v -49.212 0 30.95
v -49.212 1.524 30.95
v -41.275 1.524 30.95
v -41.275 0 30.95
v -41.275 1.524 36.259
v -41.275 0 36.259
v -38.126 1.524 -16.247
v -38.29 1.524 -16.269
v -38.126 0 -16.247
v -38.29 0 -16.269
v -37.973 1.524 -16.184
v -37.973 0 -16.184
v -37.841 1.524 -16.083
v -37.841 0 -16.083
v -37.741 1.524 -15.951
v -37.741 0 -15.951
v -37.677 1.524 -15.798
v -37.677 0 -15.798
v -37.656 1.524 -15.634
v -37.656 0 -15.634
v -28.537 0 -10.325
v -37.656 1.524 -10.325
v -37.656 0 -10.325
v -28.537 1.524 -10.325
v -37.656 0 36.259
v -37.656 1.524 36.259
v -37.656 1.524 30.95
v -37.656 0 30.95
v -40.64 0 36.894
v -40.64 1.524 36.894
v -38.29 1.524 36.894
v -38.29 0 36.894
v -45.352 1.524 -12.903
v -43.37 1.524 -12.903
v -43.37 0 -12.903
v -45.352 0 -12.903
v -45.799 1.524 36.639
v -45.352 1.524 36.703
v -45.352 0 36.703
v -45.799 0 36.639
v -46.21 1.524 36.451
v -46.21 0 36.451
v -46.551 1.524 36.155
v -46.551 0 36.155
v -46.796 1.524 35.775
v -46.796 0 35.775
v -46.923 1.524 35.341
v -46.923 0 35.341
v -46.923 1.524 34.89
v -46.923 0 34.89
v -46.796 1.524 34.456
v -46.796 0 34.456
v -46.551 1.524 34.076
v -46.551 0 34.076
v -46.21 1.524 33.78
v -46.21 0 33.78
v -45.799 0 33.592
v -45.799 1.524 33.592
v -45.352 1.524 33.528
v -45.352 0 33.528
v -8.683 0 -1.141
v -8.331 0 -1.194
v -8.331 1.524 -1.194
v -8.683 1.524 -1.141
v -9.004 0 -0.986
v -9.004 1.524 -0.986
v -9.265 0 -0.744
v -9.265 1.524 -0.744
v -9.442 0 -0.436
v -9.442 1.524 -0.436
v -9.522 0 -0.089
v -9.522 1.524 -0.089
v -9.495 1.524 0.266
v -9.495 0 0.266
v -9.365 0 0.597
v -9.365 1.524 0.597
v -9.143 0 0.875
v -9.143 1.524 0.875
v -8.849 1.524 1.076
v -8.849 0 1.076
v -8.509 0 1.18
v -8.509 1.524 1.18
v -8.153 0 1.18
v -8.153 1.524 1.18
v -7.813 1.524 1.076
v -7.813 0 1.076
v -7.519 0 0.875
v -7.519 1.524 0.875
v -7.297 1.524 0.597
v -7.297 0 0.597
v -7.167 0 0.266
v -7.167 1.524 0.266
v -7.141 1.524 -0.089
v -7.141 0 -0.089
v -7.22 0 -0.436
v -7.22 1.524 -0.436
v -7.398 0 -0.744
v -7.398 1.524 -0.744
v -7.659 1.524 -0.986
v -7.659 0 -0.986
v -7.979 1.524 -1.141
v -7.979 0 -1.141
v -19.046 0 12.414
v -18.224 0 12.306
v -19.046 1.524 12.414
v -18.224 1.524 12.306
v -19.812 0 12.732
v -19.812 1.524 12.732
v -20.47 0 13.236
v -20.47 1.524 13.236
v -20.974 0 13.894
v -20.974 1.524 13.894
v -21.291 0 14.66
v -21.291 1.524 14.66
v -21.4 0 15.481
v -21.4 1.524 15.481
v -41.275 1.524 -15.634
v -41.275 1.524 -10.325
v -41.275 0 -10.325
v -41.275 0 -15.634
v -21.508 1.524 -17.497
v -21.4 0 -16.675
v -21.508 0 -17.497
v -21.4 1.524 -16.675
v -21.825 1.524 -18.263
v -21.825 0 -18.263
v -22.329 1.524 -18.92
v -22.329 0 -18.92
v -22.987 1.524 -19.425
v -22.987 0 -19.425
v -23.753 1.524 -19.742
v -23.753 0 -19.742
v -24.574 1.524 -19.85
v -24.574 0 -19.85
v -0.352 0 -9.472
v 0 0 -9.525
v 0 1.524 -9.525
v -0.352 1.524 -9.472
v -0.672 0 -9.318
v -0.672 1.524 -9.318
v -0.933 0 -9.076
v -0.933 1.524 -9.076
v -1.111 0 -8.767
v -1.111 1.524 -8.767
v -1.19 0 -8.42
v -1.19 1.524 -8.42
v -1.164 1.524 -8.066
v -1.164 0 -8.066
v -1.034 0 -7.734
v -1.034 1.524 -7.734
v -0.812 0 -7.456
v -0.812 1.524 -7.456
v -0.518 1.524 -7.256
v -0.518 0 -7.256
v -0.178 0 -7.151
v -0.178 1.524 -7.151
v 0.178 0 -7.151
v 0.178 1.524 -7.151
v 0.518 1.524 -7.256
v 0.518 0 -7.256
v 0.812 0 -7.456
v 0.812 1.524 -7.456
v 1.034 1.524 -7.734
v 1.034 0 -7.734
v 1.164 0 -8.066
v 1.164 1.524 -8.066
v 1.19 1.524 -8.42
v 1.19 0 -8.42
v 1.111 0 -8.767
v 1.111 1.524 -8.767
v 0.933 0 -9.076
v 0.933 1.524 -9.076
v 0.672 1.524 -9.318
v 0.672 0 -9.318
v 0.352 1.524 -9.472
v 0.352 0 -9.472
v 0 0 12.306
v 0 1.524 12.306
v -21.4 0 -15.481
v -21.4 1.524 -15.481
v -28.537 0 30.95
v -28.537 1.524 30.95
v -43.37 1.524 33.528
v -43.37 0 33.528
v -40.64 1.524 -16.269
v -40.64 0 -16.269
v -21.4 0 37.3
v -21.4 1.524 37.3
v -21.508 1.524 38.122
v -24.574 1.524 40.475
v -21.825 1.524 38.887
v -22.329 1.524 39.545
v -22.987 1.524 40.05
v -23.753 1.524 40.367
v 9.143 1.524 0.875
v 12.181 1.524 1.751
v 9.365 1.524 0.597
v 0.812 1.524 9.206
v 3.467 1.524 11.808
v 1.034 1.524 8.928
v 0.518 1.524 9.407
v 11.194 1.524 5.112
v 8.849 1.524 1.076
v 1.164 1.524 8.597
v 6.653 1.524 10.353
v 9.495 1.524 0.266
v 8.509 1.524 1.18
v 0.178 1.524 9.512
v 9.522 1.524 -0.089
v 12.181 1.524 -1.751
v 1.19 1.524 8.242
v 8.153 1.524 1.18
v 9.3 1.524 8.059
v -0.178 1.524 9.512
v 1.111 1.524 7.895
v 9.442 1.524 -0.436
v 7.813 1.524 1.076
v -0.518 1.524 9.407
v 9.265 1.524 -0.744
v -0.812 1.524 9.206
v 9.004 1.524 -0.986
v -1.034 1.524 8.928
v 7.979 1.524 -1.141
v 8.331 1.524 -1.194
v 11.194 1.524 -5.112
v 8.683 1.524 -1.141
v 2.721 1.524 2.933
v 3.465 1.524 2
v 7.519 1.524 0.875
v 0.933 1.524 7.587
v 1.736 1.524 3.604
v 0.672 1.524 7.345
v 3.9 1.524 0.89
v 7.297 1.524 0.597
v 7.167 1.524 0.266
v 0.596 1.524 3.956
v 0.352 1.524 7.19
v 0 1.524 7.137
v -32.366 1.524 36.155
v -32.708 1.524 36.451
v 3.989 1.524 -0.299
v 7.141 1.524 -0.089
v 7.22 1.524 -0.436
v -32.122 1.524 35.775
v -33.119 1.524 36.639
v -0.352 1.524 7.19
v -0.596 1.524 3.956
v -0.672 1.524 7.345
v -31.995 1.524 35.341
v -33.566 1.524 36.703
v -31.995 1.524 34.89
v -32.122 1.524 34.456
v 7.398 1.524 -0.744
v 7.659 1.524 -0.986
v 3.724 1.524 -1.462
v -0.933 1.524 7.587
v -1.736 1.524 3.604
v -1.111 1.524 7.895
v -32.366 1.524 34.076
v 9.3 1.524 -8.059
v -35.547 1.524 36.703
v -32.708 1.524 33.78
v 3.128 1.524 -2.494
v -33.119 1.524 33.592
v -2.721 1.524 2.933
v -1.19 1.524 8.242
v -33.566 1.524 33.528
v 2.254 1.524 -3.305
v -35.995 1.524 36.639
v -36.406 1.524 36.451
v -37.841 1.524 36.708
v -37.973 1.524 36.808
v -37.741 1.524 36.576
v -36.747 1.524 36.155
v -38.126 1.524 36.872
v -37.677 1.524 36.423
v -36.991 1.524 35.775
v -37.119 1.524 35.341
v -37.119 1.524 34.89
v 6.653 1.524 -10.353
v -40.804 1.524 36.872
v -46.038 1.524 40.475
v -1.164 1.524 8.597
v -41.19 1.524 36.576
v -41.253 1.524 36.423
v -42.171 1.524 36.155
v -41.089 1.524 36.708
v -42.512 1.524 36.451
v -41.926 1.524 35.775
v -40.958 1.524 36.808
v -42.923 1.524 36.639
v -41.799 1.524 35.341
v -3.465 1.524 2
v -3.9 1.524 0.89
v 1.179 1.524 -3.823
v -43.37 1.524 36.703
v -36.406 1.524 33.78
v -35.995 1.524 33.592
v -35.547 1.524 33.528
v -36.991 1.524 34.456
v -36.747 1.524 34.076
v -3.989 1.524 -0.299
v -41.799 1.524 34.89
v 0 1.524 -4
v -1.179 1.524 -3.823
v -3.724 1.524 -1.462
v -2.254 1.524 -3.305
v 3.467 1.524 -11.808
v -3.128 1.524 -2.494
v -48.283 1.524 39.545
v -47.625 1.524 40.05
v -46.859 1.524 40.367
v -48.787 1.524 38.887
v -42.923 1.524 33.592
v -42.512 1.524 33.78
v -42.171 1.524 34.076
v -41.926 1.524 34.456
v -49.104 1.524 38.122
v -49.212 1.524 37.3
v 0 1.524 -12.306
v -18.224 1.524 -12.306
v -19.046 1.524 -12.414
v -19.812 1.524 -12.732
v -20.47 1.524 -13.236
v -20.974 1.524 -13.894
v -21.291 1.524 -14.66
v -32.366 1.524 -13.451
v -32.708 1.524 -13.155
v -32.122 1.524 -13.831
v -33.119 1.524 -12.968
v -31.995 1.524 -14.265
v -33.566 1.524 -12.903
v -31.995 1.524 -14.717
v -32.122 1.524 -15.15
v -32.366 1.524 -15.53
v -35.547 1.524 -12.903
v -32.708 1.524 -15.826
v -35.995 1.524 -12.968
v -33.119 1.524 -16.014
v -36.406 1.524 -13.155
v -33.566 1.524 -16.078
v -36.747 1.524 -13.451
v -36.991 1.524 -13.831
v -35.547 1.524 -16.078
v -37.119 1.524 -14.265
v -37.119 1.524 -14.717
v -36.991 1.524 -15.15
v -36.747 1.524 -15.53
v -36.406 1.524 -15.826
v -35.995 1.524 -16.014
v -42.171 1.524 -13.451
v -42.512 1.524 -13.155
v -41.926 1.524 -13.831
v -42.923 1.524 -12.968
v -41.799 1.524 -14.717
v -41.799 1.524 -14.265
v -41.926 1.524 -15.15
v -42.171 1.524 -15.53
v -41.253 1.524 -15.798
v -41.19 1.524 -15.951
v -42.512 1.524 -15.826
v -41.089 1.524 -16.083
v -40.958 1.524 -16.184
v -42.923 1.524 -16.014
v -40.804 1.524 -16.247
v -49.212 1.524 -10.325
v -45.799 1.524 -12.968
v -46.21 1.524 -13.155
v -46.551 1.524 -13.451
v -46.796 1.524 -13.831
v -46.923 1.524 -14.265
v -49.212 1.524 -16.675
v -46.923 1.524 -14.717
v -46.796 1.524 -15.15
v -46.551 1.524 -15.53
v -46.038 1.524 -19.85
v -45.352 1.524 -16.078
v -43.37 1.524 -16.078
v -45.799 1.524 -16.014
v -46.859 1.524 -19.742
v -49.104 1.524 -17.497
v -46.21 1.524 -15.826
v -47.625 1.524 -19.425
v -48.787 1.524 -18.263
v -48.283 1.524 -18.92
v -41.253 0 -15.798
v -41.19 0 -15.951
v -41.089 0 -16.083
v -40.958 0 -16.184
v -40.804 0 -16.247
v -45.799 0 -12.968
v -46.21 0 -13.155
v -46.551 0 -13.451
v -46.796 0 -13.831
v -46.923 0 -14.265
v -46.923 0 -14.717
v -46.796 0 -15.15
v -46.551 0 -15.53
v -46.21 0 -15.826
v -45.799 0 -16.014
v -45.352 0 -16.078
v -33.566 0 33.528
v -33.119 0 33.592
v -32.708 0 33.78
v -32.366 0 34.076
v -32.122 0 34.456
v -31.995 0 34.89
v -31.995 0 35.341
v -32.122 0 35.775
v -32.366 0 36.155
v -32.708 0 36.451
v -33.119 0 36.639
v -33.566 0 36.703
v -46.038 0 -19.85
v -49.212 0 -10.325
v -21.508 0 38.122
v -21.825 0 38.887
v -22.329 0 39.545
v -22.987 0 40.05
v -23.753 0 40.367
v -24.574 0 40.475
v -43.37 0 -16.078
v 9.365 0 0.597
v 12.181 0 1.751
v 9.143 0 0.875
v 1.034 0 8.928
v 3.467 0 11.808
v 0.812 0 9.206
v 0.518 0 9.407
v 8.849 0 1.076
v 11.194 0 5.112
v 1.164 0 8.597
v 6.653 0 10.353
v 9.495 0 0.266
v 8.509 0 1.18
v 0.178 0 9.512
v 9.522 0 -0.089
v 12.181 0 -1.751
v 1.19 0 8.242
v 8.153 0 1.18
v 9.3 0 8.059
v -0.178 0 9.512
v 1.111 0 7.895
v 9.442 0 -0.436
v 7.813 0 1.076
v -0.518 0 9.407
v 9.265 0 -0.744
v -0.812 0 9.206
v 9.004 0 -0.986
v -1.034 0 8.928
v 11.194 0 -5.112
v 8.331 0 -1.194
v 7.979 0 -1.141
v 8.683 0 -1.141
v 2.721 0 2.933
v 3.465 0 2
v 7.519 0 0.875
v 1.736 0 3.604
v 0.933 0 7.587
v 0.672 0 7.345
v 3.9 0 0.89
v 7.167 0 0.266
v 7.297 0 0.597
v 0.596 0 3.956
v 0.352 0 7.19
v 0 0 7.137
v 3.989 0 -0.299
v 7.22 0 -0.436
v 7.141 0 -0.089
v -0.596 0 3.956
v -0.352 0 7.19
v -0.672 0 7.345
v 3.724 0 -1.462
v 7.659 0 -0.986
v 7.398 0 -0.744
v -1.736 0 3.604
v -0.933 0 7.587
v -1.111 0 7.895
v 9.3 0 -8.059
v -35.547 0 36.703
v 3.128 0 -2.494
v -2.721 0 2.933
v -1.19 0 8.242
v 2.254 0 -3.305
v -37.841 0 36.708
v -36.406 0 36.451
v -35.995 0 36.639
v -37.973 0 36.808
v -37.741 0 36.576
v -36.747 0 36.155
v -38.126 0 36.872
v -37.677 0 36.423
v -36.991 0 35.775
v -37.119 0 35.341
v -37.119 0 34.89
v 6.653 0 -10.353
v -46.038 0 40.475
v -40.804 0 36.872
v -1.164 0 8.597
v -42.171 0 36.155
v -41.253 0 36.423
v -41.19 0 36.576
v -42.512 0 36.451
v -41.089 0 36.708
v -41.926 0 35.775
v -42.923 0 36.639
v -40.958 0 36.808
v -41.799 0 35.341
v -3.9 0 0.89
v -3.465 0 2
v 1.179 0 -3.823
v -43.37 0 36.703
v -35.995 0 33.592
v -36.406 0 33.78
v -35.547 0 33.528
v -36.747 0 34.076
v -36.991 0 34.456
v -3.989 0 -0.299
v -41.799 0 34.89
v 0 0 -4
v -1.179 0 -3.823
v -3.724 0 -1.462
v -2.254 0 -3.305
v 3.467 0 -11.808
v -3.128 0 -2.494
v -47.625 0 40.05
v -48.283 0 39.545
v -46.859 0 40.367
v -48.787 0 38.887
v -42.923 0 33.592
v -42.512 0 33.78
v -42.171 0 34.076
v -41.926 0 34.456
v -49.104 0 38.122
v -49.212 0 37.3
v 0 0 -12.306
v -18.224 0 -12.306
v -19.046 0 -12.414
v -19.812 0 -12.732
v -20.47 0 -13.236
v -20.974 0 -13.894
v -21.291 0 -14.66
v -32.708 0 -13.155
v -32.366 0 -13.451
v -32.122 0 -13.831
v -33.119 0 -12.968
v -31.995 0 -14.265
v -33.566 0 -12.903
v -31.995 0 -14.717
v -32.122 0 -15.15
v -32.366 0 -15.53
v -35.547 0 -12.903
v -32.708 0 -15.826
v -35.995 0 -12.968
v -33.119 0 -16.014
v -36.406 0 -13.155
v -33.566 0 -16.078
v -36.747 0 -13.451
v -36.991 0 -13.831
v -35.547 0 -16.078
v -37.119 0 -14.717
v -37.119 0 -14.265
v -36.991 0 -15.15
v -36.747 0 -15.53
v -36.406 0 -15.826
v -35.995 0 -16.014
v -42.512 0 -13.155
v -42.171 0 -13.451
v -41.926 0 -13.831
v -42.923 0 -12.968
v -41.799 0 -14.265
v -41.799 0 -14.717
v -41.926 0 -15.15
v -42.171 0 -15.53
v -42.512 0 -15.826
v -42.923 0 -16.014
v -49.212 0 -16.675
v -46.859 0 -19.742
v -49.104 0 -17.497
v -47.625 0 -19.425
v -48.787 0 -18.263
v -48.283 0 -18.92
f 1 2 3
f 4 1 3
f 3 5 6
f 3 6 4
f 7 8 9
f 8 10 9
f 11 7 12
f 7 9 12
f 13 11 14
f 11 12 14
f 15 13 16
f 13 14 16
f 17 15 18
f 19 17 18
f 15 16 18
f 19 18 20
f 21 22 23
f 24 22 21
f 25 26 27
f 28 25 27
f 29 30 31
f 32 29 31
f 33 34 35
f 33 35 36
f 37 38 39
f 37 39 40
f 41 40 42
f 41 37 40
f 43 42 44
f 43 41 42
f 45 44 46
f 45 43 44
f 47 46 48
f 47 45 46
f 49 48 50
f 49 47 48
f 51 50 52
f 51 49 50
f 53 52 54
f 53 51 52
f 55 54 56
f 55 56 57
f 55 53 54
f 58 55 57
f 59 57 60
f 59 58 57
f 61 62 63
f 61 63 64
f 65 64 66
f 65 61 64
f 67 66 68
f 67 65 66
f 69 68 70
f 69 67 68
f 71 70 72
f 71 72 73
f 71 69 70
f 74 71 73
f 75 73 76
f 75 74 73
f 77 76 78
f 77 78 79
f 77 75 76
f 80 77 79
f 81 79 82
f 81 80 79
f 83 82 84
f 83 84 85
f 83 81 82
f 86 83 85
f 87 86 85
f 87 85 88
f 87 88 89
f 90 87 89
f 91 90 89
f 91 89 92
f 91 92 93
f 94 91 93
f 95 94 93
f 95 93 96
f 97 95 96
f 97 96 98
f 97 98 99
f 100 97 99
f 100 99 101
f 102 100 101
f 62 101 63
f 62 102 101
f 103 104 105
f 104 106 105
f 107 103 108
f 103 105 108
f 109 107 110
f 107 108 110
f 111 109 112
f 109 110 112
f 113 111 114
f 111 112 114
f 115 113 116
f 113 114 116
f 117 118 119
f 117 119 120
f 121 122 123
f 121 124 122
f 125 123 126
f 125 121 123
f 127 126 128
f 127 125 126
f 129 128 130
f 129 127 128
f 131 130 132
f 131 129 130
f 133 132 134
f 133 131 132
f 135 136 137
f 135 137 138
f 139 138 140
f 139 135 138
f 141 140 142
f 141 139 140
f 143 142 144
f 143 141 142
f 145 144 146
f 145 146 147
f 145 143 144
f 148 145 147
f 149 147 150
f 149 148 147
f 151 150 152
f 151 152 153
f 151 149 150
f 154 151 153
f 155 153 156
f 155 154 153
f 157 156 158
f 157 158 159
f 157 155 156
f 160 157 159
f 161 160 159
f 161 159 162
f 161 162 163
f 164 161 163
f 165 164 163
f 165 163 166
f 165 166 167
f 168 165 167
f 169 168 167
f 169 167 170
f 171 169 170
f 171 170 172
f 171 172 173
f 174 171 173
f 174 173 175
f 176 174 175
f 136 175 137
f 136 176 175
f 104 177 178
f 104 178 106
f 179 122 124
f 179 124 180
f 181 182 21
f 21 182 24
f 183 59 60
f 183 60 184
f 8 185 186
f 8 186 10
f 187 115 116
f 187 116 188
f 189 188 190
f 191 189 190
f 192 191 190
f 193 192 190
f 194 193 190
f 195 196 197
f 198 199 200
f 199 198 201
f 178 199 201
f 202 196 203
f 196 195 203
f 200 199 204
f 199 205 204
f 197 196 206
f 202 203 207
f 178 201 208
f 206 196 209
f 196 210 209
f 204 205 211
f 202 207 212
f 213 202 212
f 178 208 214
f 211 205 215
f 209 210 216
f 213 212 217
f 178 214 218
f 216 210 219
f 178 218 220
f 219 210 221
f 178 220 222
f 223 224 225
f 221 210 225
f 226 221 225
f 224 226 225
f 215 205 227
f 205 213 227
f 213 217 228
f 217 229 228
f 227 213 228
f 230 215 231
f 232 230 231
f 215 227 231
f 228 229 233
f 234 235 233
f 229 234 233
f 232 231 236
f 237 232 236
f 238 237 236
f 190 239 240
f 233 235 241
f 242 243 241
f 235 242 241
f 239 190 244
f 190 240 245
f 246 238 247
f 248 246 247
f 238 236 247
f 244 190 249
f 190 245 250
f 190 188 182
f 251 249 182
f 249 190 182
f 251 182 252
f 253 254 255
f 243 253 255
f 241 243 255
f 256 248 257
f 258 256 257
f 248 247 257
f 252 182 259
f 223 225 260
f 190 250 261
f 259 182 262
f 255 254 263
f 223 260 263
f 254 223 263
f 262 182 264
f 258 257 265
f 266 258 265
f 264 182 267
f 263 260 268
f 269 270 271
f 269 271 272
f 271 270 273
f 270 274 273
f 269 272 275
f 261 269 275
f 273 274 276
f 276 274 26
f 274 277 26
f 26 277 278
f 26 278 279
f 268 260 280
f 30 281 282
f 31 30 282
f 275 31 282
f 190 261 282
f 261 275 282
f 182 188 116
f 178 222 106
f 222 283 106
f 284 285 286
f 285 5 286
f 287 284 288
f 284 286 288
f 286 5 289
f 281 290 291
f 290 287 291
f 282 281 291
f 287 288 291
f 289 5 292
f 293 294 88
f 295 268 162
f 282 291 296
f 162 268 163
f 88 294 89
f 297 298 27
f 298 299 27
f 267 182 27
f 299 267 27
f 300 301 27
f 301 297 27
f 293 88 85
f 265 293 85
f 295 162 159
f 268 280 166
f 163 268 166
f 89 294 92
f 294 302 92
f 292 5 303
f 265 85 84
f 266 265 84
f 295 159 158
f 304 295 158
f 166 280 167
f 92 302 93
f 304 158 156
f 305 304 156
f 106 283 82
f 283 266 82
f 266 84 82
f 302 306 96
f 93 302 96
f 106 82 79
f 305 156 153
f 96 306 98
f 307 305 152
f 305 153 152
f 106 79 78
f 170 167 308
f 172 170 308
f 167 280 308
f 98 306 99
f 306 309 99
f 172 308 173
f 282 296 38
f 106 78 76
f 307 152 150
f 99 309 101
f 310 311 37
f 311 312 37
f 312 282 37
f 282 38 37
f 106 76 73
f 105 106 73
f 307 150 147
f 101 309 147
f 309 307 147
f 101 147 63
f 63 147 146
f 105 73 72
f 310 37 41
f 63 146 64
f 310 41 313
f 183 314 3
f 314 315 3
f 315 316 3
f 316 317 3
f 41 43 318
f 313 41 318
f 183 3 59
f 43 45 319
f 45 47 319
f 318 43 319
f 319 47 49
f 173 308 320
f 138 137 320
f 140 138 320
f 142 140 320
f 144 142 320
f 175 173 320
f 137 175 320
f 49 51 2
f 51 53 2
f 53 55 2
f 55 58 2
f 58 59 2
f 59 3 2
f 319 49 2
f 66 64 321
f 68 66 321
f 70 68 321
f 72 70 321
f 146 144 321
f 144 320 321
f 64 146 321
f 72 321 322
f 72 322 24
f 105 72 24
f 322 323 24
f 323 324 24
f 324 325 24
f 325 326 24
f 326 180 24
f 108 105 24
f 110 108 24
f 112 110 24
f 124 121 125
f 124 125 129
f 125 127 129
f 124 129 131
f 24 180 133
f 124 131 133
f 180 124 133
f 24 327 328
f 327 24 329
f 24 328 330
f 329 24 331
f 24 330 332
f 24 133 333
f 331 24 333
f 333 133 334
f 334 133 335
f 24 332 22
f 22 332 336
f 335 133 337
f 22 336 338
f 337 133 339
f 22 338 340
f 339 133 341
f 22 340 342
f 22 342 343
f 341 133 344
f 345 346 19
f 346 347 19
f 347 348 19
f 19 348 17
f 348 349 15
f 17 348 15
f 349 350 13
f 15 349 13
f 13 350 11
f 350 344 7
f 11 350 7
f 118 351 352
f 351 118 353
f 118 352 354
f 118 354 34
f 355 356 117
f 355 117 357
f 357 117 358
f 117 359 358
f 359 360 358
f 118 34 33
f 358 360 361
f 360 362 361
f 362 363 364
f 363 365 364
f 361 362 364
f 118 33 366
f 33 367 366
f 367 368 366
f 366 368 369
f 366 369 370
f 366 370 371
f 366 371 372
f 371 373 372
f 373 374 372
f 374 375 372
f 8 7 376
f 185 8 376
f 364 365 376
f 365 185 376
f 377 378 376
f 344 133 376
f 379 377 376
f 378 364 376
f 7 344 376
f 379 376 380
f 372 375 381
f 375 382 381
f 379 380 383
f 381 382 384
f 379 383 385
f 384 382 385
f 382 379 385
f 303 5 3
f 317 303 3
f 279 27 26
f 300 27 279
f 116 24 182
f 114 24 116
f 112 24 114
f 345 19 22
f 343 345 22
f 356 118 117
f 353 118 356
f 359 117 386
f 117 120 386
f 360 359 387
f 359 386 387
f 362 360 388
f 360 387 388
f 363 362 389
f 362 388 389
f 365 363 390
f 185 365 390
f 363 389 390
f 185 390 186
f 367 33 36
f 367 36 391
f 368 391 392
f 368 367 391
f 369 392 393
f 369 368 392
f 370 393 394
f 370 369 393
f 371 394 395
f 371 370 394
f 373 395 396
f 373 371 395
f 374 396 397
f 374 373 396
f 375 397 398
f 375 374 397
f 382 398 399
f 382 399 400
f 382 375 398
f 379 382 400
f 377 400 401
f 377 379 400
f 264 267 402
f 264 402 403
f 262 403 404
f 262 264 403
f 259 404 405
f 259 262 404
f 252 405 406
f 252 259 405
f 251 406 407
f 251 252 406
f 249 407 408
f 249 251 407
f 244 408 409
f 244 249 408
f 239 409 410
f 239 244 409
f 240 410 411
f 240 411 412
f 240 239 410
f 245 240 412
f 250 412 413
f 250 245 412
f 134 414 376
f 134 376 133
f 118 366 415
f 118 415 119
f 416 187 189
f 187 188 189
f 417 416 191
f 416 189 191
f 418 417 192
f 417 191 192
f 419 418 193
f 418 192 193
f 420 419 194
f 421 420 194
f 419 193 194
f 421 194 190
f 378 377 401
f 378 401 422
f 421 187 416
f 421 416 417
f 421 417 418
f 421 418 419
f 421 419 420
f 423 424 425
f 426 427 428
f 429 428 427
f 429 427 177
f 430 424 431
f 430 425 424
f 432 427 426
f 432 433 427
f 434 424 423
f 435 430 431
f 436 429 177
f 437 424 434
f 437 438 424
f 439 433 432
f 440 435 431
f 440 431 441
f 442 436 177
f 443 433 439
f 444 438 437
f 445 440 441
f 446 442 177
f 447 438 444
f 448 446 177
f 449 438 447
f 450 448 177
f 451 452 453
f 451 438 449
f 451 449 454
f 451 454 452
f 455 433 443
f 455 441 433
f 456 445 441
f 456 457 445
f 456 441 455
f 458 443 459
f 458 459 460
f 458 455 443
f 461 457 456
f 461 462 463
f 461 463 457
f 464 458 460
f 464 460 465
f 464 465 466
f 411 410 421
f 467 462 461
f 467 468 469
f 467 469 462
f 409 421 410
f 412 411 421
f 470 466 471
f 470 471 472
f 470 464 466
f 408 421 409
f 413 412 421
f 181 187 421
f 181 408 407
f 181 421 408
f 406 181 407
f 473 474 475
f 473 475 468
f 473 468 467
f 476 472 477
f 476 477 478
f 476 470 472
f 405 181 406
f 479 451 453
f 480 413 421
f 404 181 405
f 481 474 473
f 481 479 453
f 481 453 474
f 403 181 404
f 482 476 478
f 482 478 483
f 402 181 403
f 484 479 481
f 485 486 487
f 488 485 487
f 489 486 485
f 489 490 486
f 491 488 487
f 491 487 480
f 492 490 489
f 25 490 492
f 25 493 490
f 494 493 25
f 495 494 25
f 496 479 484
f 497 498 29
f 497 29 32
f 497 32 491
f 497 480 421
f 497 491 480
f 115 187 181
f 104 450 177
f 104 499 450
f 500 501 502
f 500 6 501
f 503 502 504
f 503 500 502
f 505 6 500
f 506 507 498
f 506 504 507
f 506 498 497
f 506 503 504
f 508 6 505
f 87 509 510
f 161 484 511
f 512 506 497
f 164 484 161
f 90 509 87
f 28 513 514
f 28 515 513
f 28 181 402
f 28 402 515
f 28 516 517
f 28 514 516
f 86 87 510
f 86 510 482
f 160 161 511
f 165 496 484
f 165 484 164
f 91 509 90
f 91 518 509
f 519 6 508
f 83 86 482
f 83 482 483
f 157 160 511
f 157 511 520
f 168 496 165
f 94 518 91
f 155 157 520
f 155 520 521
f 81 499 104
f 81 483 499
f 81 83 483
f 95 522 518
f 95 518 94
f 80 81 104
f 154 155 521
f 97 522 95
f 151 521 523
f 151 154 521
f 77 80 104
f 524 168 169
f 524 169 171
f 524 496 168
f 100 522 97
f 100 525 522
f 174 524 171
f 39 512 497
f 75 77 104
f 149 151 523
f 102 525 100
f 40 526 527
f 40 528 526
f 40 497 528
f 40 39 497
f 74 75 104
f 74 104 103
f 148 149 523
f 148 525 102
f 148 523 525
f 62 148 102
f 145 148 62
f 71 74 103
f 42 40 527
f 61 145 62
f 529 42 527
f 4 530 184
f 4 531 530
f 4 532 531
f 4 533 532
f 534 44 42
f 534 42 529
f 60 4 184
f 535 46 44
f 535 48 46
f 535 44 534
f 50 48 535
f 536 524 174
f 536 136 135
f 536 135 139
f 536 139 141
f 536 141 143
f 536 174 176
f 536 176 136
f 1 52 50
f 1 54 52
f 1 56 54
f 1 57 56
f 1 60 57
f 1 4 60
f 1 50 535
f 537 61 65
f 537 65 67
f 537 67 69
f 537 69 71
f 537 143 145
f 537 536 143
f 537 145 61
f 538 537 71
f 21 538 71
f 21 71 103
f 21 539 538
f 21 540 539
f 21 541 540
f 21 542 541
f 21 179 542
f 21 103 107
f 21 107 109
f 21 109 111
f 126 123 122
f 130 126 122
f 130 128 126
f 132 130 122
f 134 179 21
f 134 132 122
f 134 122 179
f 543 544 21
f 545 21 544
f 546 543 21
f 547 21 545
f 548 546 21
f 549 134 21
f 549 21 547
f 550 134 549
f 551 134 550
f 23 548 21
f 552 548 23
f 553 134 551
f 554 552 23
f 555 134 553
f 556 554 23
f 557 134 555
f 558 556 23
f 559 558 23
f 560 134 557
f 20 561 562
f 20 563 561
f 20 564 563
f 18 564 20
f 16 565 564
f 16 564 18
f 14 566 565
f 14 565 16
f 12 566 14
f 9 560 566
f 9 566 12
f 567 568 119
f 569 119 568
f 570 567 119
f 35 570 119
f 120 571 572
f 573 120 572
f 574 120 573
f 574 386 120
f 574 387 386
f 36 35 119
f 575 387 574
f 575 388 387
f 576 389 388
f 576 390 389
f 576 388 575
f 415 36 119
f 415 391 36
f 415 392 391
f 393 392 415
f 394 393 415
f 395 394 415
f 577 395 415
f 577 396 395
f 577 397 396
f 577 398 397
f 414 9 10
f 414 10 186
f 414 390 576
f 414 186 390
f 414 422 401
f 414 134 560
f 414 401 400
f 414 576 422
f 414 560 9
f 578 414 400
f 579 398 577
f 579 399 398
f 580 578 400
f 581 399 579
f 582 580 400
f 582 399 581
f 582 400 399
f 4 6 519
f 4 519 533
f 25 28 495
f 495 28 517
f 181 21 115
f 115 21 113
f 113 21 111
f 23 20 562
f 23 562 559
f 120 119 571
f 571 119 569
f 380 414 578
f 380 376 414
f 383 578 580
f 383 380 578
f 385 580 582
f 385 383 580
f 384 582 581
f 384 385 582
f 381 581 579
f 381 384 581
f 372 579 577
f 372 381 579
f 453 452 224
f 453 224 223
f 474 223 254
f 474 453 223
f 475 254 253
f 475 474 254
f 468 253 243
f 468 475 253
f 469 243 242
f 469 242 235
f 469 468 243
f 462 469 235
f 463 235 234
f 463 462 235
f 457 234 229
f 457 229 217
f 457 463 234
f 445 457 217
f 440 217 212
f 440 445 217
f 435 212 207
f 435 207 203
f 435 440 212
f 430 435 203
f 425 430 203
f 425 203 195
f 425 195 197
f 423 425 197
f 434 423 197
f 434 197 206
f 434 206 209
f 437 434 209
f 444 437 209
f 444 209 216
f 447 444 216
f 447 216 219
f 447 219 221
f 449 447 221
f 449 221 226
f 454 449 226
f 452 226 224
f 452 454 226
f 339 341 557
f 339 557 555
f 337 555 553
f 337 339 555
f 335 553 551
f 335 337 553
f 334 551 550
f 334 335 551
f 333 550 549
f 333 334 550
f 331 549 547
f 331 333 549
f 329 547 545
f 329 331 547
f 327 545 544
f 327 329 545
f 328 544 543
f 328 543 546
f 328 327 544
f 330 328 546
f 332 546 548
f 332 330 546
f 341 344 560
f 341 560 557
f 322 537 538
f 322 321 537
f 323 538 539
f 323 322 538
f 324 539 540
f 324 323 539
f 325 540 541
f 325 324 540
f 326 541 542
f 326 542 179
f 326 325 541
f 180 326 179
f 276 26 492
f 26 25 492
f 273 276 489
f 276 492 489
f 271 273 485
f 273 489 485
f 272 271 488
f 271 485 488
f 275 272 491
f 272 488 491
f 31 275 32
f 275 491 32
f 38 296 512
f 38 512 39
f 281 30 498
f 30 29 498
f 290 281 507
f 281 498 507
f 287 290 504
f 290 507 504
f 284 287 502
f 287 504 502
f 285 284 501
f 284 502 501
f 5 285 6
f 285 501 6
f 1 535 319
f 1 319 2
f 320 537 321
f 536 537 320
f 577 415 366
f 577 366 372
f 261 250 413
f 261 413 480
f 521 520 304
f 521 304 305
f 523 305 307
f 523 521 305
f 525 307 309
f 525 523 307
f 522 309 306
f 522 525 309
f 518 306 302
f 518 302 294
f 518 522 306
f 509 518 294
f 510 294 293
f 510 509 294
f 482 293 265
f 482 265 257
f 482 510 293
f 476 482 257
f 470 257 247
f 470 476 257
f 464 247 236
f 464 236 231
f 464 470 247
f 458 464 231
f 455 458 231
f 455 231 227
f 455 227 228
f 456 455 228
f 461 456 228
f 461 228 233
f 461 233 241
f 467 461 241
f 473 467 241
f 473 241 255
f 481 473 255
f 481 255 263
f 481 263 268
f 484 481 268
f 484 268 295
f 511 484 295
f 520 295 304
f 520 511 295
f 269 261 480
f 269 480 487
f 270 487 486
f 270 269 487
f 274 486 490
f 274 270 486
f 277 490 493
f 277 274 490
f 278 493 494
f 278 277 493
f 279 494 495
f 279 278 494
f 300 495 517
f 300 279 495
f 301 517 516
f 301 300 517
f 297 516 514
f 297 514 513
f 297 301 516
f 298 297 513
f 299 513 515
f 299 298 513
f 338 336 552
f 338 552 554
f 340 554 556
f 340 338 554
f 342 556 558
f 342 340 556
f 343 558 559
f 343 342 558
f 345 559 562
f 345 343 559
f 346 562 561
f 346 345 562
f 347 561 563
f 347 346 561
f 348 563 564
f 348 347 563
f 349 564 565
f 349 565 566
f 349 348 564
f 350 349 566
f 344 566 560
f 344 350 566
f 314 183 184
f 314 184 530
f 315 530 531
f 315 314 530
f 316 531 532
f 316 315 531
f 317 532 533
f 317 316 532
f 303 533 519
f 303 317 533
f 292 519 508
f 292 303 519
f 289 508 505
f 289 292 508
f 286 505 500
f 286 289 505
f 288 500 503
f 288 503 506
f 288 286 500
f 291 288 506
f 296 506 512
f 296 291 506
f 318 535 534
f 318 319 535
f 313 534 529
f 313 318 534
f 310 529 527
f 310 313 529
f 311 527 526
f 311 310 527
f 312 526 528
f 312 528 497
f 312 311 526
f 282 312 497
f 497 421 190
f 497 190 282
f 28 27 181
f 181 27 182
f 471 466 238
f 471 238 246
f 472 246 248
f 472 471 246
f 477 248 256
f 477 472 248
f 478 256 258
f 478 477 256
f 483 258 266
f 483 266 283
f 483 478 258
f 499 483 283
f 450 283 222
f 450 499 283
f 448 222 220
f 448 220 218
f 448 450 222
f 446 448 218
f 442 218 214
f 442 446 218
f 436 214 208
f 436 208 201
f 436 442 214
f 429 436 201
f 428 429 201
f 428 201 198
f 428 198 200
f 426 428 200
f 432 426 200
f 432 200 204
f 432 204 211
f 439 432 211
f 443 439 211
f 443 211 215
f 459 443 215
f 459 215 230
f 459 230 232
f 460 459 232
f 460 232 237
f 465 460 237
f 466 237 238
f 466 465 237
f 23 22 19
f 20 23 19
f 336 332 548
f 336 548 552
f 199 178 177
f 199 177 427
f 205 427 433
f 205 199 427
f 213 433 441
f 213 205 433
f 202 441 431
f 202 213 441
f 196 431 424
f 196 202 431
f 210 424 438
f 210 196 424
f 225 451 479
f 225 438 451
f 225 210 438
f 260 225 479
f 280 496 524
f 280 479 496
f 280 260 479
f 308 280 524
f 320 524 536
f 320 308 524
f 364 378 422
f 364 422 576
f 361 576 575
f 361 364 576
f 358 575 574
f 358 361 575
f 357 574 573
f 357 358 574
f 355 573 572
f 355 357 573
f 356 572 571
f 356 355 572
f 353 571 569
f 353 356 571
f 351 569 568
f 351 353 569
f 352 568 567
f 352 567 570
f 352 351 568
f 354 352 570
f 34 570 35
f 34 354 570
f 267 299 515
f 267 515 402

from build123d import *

# Parameters (mm, degrees)
SKETCH1_R          = 4.0005
SKETCH1_R_2        = 1.1938
BASE_FLANGE1_DEPTH = 1.524
SKETCH3_W          = 20.6756
SKETCH3_H          = 41.275
EXTRUDE1_DEPTH     = 1.524
SKETCH4_W          = 3.6195
SKETCH4_H          = 5.9436
EXTRUDE2_DEPTH     = 1.524
FILLET1_R          = 3.175
FILLET2_RADIUS     = 12.3063
FILLET2_LENGTH     = 1.524
FILLET3_R          = 0.635


# Sheet-metal steps are written as plain solids
with BuildPart() as part:
    # Sketch1 → Base-Flange1 (new body)
    with BuildSketch(Plane(origin=(0, 0, 0), x_dir=(1, 0, 0), z_dir=(0, 1, 0))):
        Polygon((12.3063, 12.3063), (12.3063, -12.3063), (-21.3995, -12.3063), (-21.3995, -40.4749), (-49.2125, -40.4749), (-49.2125, 19.8501), (-21.3995, 19.8501), (-21.3995, 12.3063), align=None)
        with Locations(Location((0, 0, 0), (0, 0, 90))):
            Circle(SKETCH1_R, mode=Mode.SUBTRACT)
        with Locations(Location((0, 8.3312, 0), (0, 0, 90))):
            Circle(SKETCH1_R_2, mode=Mode.SUBTRACT)
        with Locations(Location((8.3312, 0, 0), (0, 0, 90))):
            Circle(SKETCH1_R_2, mode=Mode.SUBTRACT)
        with Locations(Location((0, -8.3312, 0), (0, 0, 90))):
            Circle(SKETCH1_R_2, mode=Mode.SUBTRACT)
        with Locations(Location((-8.3312, 0, 0), (0, 0, 90))):
            Circle(SKETCH1_R_2, mode=Mode.SUBTRACT)
    extrude(amount=BASE_FLANGE1_DEPTH)

    # Sketch3 → Extrude1 (cut)
    with BuildSketch(Plane(origin=(0, 1.524, 0), x_dir=(1, 0, 0), z_dir=(0, 1, 0))):
        with Locations((-38.8747, -10.3124)):
            Rectangle(SKETCH3_W, SKETCH3_H)
    extrude(amount=-EXTRUDE1_DEPTH, mode=Mode.SUBTRACT)

    # Sketch4 → Extrude2 (cut)
    with BuildSketch(Plane(origin=(0, 1.524, 0), x_dir=(1, 0, 0), z_dir=(0, 1, 0))):
        with Locations((-39.46525, 13.2969)):
            Rectangle(SKETCH4_W, SKETCH4_H)
        with Locations((-39.46525, -33.9217)):
            Rectangle(SKETCH4_W, SKETCH4_H)
        with BuildLine():
            Line((-35.5473, 16.0782), (-33.5661, 16.0782))
            ThreePointArc((-33.5661, 16.0782), (-31.9786, 14.4907), (-33.5661, 12.9032))
            Line((-33.5661, 12.9032), (-35.5473, 12.9032))
            ThreePointArc((-35.5473, 12.9032), (-37.1348, 14.4907), (-35.5473, 16.0782))
        make_face()
        with BuildLine():
            Line((-45.3517, 16.0782), (-43.3705, 16.0782))
            ThreePointArc((-43.3705, 16.0782), (-41.783, 14.4907), (-43.3705, 12.9032))
            Line((-43.3705, 12.9032), (-45.3517, 12.9032))
            ThreePointArc((-45.3517, 12.9032), (-46.9392, 14.4907), (-45.3517, 16.0782))
        make_face()
        with BuildLine():
            Line((-35.5473, -33.528), (-33.5661, -33.528))
            ThreePointArc((-33.5661, -33.528), (-31.9786, -35.1155), (-33.5661, -36.703))
            Line((-33.5661, -36.703), (-35.5473, -36.703))
            ThreePointArc((-35.5473, -36.703), (-37.1348, -35.1155), (-35.5473, -33.528))
        make_face()
        with BuildLine():
            Line((-45.3517, -33.528), (-43.3705, -33.528))
            ThreePointArc((-43.3705, -33.528), (-41.783, -35.1155), (-43.3705, -36.703))
            Line((-43.3705, -36.703), (-45.3517, -36.703))
            ThreePointArc((-45.3517, -36.703), (-46.9392, -35.1155), (-45.3517, -33.528))
        make_face()
    extrude(amount=-EXTRUDE2_DEPTH, mode=Mode.SUBTRACT)

    # Fillet1
    fillet1_edges = [part.edges().sort_by_distance(p)[0] for p in [
        (-21.3995, 0.762, 12.3063),
        (-21.3995, 0.762, 40.4749),
        (-49.2125, 0.762, 40.4749),
        (-49.2125, 0.762, -19.8501),
        (-21.3995, 0.762, -19.8501),
        (-21.3995, 0.762, -12.3063),
    ]]
    fillet(fillet1_edges, radius=FILLET1_R)

    # Fillet2: full round fillet: the end face becomes a half cylinder, R = half its width
    fillet2_face = Plane((12.3063, 0.762, 0), x_dir=(0, 1, 0), z_dir=(1, 0, 0))  # on the end face: x along it, z out of the body
    fillet2_slab = fillet2_face.offset(-FILLET2_RADIUS / 2) * Box(FILLET2_LENGTH, 2 * FILLET2_RADIUS, FILLET2_RADIUS, mode=Mode.PRIVATE)  # the body's end, R deep
    fillet2_round = Plane((0, 0.762, 0), x_dir=(1, 0, 0), z_dir=(0, 1, 0)) * Cylinder(FILLET2_RADIUS, FILLET2_LENGTH, mode=Mode.PRIVATE)  # its axis R under the face
    add(fillet2_slab - fillet2_round, mode=Mode.SUBTRACT)

    # Fillet3
    fillet3_edges = [part.edges().sort_by_distance(p)[0] for p in [
        (-41.275, 0.762, -16.2687),
        (-37.6555, 0.762, -16.2687),
        (-41.275, 0.762, 36.8935),
        (-37.6555, 0.762, 36.8935),
    ]]
    fillet(fillet3_edges, radius=FILLET3_R)


solid = part.part
